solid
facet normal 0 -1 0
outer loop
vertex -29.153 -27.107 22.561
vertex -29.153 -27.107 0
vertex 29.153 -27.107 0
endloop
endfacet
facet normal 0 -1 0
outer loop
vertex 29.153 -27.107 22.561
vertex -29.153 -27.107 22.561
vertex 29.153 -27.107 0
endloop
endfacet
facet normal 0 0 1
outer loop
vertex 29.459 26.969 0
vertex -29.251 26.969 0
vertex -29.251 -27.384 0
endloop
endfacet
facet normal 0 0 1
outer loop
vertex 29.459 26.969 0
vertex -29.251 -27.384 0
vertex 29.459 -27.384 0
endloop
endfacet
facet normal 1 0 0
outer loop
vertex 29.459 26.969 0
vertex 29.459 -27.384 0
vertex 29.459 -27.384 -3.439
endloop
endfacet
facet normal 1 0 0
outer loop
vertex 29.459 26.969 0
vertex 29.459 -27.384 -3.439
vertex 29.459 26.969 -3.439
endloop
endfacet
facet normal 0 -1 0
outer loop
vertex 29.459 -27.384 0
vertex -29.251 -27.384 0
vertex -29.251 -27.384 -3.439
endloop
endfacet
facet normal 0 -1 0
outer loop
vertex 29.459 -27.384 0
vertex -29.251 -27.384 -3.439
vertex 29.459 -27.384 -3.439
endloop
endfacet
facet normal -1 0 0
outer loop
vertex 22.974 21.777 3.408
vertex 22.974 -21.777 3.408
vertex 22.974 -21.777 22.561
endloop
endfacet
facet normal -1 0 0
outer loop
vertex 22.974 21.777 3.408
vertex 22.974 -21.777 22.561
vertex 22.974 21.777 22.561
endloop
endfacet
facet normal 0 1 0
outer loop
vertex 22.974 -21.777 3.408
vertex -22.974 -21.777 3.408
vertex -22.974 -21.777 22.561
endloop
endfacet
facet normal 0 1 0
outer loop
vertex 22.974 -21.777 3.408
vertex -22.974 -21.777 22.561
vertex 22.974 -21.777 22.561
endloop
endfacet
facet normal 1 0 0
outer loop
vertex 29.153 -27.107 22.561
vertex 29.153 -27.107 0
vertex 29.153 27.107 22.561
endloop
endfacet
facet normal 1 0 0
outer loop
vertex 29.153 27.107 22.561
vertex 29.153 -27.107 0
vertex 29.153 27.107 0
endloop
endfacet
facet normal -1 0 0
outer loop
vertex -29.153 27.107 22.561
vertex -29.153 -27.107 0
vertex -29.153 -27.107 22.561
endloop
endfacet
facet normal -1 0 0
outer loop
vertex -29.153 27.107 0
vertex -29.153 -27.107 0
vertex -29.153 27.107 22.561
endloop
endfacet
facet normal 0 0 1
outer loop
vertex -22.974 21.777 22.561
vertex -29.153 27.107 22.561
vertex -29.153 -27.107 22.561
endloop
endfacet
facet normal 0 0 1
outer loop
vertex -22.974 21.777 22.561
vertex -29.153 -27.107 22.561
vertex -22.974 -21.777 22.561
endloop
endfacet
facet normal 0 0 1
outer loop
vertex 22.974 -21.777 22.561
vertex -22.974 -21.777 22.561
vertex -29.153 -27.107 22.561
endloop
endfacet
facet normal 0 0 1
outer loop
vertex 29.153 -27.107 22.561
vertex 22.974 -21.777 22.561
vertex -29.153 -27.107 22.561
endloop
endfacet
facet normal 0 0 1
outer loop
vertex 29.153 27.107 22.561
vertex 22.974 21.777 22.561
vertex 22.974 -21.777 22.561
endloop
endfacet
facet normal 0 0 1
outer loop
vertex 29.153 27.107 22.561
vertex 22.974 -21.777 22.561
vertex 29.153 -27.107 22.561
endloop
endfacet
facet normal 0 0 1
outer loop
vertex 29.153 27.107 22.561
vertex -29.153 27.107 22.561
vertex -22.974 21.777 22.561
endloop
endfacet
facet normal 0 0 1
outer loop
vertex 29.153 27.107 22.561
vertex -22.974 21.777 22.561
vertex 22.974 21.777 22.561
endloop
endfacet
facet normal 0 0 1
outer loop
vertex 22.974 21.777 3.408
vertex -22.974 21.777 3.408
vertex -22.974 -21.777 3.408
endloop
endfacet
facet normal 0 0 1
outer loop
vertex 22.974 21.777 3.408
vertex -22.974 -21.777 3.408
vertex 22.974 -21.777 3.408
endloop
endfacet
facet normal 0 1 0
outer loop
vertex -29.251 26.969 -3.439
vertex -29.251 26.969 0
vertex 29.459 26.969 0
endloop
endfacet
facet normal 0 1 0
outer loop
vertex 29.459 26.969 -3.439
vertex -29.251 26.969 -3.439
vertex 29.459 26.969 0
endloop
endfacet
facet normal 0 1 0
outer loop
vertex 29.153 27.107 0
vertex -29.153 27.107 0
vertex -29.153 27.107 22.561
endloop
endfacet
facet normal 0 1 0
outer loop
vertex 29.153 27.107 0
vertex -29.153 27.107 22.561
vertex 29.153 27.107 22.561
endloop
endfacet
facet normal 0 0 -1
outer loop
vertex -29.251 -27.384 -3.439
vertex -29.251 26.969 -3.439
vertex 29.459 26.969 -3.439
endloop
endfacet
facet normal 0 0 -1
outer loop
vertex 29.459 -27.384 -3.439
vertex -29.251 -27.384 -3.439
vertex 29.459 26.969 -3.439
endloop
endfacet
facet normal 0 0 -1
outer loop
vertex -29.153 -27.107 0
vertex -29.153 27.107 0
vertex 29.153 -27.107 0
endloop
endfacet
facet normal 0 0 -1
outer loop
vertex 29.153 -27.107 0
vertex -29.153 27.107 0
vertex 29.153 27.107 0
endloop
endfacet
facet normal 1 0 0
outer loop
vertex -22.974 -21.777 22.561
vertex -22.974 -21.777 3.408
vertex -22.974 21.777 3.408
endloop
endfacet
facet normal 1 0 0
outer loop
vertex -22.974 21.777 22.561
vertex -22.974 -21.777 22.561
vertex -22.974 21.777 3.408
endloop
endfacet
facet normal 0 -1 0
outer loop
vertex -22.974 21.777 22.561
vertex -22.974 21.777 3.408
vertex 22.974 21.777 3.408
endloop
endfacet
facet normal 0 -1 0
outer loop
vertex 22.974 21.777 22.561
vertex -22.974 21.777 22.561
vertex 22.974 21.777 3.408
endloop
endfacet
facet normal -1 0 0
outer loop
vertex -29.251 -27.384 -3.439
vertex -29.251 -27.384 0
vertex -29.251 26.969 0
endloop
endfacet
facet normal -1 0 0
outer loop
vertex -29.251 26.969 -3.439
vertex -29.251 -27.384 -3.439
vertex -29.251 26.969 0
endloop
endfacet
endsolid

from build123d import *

# Parameters (mm, degrees)
F0_W     = 58.305382
F0_H     = 54.213792
F0_W_2   = 45.94864
F0_H_2   = 43.553084
F1_DEPTH = 22.560567
F2_DEPTH = 3.407711
F3_W     = 58.710366
F3_H     = 54.353766
F4_DEPTH = 3.438855


with BuildPart() as f1:
    # F0 (on Top) → F1 (new body)
    with BuildSketch(Plane.XY):
        Rectangle(F0_W, F0_H)
        Rectangle(F0_W_2, F0_H_2, mode=Mode.SUBTRACT)
    extrude(amount=F1_DEPTH)

    # F0 (on Top) → F2 (join)
    with BuildSketch(Plane.XY):
        Rectangle(F0_W_2, F0_H_2)
    extrude(amount=F2_DEPTH)


with BuildPart() as f4:
    # F3 (on Top) → F4 (new body)
    with BuildSketch(Plane.XY):
        with Locations((0.103697, -0.207443)):
            Rectangle(F3_W, F3_H)
    extrude(amount=-F4_DEPTH)


solid = Compound([f1.part, f4.part])
